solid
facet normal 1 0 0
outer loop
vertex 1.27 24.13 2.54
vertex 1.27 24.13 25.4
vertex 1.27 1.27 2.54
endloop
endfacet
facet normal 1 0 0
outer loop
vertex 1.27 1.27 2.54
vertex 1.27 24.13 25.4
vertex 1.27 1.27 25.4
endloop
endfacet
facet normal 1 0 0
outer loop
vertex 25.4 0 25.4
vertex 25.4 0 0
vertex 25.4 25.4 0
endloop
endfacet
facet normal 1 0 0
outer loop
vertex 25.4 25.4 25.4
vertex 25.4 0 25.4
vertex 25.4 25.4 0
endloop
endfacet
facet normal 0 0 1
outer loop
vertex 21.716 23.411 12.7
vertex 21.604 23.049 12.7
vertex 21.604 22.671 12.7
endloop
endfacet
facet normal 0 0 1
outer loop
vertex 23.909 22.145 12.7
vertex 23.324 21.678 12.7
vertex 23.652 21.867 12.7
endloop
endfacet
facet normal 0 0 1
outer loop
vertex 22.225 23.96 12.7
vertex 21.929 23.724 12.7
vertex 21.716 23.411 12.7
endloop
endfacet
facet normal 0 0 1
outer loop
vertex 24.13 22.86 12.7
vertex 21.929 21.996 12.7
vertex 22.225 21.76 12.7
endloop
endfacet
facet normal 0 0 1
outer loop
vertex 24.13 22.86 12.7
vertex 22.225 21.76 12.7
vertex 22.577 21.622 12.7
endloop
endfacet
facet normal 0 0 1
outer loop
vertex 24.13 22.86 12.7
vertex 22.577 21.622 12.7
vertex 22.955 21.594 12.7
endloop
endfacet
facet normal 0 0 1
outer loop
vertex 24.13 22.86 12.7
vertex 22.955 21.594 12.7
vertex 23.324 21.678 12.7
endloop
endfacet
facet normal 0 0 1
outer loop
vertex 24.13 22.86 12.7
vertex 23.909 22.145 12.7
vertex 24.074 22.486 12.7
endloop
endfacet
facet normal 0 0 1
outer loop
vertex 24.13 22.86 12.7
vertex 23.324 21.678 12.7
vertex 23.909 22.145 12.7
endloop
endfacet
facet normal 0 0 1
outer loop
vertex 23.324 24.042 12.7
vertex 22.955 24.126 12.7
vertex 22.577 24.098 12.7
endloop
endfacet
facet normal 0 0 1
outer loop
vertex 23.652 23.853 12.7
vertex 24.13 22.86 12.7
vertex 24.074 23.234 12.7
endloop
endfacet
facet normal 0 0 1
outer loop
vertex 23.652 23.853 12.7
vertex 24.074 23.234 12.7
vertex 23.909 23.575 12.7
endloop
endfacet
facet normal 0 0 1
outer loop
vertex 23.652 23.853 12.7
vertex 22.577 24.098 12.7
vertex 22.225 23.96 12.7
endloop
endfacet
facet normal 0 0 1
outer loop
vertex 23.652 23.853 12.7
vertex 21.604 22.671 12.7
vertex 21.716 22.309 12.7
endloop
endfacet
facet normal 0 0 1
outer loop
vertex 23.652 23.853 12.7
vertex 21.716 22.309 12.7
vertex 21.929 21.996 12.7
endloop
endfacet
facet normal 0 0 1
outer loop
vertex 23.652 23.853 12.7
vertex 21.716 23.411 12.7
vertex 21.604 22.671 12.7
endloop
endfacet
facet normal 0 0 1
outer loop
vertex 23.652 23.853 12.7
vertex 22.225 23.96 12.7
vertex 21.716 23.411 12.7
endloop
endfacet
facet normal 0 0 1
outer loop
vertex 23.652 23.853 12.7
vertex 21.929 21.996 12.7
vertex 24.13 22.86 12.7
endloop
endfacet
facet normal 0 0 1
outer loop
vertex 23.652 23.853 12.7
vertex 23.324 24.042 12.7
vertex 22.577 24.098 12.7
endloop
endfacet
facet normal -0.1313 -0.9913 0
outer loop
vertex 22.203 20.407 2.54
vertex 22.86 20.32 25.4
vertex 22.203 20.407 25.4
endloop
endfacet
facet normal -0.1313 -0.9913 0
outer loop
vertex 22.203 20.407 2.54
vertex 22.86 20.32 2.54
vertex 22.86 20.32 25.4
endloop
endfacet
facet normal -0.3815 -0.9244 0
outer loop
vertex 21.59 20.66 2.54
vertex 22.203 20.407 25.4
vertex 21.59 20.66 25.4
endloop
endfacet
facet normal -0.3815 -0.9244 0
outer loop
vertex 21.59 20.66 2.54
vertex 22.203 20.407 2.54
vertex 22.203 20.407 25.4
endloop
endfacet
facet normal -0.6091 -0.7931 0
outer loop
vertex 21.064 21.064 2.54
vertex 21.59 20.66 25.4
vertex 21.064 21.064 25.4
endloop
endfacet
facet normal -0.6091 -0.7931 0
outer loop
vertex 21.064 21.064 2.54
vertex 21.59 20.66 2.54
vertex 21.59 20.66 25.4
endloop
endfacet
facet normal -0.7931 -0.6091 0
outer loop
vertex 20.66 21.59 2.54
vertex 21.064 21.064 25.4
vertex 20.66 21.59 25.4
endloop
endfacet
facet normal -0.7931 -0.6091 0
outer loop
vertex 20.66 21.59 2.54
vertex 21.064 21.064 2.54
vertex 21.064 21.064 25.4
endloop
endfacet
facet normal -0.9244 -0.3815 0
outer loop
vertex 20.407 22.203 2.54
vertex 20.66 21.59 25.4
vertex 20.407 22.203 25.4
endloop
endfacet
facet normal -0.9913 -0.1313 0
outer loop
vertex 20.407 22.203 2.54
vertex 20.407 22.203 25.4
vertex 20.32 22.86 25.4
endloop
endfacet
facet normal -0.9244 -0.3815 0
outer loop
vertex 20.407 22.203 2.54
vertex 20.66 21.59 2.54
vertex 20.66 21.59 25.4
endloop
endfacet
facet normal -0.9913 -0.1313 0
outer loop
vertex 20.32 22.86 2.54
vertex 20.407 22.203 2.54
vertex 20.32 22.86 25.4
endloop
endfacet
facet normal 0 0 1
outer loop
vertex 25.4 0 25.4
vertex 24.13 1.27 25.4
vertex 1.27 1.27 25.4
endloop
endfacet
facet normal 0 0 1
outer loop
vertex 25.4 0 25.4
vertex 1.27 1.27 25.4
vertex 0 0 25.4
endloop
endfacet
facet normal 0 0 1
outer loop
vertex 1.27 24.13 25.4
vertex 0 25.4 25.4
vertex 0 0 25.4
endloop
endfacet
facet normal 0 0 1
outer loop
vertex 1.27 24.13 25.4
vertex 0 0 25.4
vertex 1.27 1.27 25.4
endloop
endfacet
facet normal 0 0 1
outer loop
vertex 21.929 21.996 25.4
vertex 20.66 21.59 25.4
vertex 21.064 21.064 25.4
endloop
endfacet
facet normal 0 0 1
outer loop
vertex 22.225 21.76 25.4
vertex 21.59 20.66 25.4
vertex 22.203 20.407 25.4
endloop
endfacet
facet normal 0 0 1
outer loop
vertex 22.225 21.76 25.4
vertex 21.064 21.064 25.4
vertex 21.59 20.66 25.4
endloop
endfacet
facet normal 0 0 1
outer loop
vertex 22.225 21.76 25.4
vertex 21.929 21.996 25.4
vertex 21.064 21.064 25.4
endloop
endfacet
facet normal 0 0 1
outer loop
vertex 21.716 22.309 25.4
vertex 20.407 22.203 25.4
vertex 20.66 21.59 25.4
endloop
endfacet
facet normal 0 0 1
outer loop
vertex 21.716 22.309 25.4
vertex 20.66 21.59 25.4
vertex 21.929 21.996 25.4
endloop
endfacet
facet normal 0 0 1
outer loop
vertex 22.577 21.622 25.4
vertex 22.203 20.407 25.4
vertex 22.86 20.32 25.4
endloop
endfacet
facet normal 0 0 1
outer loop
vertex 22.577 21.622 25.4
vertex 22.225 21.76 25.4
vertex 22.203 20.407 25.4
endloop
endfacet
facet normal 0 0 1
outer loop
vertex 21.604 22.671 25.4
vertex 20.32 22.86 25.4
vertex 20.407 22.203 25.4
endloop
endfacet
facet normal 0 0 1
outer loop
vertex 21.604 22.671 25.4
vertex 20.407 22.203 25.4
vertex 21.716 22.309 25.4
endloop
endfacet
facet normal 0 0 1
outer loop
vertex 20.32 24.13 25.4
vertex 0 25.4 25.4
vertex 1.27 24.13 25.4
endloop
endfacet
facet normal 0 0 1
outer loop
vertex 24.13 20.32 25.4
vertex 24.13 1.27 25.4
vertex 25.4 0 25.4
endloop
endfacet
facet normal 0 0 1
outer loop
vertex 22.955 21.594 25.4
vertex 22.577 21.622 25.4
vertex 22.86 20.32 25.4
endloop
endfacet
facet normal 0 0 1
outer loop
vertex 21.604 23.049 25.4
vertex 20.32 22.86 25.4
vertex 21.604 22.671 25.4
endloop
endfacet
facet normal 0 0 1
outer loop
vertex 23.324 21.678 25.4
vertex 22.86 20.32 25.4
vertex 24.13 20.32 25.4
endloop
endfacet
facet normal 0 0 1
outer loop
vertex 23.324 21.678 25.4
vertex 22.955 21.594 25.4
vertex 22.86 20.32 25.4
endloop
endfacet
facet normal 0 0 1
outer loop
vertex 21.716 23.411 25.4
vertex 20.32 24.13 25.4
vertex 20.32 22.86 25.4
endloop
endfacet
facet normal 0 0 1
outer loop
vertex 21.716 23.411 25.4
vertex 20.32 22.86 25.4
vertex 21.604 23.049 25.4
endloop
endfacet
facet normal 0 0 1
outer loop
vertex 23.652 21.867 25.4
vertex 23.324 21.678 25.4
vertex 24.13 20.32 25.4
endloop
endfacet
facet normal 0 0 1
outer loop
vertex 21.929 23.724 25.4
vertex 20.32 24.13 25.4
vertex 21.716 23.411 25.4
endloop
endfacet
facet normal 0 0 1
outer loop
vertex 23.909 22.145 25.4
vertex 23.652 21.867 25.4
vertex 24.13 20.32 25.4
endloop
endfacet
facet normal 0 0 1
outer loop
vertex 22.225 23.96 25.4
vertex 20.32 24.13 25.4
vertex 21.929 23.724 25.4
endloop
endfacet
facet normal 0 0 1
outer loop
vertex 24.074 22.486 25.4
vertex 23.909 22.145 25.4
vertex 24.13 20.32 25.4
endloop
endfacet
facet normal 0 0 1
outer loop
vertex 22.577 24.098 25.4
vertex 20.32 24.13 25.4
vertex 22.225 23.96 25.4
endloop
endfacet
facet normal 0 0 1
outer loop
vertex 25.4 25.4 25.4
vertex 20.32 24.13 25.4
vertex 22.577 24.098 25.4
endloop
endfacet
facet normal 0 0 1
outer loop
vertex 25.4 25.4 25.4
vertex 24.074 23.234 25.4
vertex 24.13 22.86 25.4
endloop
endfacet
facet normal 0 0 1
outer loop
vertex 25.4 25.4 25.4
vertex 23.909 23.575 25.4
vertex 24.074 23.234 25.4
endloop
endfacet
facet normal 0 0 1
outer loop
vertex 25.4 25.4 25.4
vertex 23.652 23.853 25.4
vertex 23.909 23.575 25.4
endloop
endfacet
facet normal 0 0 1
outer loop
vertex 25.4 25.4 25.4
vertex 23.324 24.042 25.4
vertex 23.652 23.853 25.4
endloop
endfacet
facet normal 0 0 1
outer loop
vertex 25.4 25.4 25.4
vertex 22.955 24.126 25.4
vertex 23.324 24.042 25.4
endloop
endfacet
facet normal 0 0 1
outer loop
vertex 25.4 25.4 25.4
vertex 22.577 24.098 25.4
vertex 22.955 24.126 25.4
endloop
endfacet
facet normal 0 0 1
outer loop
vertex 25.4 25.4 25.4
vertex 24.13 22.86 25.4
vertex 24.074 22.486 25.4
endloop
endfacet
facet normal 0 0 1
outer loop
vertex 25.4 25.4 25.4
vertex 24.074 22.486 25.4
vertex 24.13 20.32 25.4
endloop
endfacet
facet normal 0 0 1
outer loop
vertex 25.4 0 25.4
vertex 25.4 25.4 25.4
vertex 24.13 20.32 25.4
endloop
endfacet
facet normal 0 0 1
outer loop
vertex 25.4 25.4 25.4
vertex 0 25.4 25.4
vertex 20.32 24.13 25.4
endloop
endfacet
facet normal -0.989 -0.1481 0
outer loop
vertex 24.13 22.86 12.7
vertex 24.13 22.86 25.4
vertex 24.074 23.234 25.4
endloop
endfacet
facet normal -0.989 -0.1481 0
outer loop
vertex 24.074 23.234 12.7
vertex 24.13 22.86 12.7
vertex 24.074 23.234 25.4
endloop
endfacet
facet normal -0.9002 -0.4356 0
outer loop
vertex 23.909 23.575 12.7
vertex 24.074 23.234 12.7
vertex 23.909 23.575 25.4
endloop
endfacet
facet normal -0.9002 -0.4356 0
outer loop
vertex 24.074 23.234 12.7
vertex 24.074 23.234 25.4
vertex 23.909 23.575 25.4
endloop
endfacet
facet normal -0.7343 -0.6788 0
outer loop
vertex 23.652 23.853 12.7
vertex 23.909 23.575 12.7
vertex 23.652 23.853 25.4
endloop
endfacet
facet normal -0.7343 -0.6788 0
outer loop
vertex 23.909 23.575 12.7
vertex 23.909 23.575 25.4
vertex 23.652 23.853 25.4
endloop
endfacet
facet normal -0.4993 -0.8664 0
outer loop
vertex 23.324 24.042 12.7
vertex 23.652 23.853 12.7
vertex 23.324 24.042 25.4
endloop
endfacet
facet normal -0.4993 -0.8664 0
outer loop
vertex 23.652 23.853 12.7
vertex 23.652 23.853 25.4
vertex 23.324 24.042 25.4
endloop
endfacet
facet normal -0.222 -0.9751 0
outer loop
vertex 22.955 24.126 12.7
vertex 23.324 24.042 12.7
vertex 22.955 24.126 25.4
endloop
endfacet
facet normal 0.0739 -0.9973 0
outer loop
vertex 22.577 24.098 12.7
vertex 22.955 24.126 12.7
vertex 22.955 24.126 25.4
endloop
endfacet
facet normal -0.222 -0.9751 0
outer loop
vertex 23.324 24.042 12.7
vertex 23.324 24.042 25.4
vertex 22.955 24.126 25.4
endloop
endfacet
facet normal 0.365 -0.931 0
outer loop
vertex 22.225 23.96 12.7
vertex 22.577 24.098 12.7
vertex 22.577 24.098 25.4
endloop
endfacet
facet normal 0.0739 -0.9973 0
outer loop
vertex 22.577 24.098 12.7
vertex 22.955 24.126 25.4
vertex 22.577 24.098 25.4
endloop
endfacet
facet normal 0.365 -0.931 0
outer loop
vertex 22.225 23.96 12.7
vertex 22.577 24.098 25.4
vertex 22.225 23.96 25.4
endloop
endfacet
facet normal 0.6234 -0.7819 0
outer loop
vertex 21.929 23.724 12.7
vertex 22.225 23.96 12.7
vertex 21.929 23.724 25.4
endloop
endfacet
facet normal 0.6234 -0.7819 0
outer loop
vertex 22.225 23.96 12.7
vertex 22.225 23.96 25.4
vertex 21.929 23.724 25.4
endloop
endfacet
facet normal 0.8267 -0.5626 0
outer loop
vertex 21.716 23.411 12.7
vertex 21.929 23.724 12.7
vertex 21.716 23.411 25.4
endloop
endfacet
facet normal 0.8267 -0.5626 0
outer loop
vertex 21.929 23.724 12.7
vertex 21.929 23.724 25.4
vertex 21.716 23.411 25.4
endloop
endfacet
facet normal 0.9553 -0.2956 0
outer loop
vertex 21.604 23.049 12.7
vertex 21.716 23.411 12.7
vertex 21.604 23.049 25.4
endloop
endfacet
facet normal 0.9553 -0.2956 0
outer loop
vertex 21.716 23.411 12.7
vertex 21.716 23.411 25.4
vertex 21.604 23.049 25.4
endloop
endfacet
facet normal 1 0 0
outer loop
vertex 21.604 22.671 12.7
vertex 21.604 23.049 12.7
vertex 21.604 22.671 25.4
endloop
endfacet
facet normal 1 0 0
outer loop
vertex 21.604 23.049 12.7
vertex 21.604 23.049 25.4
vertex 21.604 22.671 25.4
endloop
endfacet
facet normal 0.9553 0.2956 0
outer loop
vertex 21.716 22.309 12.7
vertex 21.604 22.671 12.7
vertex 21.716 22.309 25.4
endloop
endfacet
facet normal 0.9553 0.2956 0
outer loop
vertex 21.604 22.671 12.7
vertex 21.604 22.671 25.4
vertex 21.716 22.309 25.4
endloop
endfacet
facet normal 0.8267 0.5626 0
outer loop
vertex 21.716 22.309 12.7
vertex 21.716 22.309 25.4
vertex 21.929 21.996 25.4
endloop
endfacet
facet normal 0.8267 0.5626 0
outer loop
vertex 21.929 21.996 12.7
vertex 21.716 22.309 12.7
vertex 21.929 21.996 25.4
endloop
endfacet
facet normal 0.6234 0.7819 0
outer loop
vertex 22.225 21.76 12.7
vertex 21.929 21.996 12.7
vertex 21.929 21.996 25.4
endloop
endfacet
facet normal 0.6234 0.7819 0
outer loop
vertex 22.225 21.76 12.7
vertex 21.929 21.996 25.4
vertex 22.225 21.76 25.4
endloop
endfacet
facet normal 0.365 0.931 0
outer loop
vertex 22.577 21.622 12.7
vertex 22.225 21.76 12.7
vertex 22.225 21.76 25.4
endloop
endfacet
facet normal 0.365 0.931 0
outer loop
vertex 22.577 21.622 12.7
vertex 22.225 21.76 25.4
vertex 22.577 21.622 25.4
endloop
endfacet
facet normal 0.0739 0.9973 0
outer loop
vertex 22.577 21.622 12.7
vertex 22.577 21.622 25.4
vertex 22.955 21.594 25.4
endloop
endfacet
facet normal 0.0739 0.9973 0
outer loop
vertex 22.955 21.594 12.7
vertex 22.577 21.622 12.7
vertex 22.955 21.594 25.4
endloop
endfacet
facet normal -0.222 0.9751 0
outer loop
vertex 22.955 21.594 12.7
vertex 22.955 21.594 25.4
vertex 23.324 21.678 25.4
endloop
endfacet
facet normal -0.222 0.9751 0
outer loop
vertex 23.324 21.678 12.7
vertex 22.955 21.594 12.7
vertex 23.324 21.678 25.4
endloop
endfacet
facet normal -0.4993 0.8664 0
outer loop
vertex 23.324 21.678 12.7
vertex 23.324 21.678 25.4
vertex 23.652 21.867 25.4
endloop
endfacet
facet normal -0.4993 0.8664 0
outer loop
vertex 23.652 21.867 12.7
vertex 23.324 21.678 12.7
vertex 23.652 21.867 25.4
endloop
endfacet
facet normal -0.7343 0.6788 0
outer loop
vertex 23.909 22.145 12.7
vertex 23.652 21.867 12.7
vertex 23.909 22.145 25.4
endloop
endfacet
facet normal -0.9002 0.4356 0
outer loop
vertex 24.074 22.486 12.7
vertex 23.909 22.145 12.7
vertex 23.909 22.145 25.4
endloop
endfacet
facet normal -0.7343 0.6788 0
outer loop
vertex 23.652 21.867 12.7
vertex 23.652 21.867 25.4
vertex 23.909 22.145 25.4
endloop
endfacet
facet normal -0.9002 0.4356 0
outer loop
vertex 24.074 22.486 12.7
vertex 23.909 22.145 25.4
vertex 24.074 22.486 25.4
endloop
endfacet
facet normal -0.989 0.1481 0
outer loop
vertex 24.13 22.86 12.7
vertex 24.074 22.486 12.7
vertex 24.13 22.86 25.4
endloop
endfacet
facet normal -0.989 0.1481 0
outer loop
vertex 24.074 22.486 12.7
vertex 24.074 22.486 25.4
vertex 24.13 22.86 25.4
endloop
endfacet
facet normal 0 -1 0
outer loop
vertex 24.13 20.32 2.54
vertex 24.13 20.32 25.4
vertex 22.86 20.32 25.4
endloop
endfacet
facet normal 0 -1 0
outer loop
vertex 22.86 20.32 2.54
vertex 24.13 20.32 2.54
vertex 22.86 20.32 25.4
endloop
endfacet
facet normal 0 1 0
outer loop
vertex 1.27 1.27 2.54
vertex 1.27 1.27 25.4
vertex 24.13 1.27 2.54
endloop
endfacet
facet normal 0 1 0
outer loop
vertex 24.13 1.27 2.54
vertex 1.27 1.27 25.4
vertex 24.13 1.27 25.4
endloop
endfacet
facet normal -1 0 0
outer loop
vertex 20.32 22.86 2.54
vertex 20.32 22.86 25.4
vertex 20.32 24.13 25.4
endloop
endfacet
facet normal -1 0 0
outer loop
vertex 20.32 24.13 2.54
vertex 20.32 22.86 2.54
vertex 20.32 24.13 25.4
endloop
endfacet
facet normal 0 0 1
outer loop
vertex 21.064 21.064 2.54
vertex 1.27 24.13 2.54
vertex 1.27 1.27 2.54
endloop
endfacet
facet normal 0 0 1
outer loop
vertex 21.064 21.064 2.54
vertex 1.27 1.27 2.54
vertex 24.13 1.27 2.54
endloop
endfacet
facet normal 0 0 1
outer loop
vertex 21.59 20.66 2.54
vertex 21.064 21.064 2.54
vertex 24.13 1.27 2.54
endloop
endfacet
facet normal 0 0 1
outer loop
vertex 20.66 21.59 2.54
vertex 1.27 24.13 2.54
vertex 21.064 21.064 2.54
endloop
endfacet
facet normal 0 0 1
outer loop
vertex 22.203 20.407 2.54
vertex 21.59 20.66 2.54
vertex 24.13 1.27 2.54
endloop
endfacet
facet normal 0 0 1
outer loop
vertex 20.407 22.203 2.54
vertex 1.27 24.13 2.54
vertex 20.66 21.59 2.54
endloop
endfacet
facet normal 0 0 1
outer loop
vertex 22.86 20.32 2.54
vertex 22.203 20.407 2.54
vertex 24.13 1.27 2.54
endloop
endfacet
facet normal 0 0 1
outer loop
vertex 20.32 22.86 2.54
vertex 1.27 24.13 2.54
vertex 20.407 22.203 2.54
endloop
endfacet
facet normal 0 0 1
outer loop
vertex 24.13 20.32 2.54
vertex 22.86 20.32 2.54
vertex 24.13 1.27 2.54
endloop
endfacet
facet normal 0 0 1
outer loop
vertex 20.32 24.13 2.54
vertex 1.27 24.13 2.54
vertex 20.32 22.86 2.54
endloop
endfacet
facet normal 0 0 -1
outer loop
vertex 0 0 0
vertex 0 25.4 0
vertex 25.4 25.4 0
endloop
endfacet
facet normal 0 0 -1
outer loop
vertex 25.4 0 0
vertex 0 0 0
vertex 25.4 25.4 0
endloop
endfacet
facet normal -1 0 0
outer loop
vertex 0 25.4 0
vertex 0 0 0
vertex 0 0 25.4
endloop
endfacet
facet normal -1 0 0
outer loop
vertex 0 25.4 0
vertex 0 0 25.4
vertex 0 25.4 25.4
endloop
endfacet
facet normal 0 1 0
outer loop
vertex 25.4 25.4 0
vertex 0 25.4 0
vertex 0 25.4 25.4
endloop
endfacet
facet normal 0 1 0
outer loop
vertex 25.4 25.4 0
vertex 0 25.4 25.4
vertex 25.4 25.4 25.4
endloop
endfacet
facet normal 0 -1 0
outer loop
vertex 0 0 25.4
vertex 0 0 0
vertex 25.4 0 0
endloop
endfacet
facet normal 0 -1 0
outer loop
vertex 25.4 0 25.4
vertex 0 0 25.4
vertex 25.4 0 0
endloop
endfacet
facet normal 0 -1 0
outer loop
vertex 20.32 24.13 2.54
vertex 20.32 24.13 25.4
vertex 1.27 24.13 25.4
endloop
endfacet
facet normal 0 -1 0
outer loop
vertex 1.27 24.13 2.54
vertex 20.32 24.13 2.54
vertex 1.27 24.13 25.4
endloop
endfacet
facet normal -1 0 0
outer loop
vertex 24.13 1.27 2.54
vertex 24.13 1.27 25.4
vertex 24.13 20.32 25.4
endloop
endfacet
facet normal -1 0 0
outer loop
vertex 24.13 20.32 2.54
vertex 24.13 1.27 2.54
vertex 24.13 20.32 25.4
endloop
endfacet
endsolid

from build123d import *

# Parameters (mm, degrees)
F0_W     = 25.4
F0_H     = 25.4
F1_DEPTH = 25.4
F2_R     = 1.27
F3_DEPTH = 12.7
F5_DEPTH = 22.86
F6_R     = 2.54


with BuildPart() as f1:
    # F0 (on Top) → F1 (new body)
    with BuildSketch(Plane.XY):
        with Locations((12.7, 12.7)):
            Rectangle(F0_W, F0_H)
    extrude(amount=F1_DEPTH)

    # F2 (on face) → F3 (cut)
    with BuildSketch(Plane.XY.offset(25.4)):
        with Locations((22.86, 22.86)):
            Circle(F2_R)
    extrude(amount=-F3_DEPTH, mode=Mode.SUBTRACT)

    # F4 (on face) → F5 (cut)
    with BuildSketch(Plane.XY.offset(25.4)):
        Polygon((24.13, 1.27), (24.13, 20.32), (20.32, 20.32), (20.32, 24.13), (1.27, 24.13), (1.27, 1.27), align=None)
    extrude(amount=-F5_DEPTH, mode=Mode.SUBTRACT)

    # F6
    f6_edges = [f1.edges().sort_by_distance(p)[0] for p in [
        (20.32, 20.32, 13.97),
    ]]
    fillet(f6_edges, radius=F6_R)


solid = f1.part
